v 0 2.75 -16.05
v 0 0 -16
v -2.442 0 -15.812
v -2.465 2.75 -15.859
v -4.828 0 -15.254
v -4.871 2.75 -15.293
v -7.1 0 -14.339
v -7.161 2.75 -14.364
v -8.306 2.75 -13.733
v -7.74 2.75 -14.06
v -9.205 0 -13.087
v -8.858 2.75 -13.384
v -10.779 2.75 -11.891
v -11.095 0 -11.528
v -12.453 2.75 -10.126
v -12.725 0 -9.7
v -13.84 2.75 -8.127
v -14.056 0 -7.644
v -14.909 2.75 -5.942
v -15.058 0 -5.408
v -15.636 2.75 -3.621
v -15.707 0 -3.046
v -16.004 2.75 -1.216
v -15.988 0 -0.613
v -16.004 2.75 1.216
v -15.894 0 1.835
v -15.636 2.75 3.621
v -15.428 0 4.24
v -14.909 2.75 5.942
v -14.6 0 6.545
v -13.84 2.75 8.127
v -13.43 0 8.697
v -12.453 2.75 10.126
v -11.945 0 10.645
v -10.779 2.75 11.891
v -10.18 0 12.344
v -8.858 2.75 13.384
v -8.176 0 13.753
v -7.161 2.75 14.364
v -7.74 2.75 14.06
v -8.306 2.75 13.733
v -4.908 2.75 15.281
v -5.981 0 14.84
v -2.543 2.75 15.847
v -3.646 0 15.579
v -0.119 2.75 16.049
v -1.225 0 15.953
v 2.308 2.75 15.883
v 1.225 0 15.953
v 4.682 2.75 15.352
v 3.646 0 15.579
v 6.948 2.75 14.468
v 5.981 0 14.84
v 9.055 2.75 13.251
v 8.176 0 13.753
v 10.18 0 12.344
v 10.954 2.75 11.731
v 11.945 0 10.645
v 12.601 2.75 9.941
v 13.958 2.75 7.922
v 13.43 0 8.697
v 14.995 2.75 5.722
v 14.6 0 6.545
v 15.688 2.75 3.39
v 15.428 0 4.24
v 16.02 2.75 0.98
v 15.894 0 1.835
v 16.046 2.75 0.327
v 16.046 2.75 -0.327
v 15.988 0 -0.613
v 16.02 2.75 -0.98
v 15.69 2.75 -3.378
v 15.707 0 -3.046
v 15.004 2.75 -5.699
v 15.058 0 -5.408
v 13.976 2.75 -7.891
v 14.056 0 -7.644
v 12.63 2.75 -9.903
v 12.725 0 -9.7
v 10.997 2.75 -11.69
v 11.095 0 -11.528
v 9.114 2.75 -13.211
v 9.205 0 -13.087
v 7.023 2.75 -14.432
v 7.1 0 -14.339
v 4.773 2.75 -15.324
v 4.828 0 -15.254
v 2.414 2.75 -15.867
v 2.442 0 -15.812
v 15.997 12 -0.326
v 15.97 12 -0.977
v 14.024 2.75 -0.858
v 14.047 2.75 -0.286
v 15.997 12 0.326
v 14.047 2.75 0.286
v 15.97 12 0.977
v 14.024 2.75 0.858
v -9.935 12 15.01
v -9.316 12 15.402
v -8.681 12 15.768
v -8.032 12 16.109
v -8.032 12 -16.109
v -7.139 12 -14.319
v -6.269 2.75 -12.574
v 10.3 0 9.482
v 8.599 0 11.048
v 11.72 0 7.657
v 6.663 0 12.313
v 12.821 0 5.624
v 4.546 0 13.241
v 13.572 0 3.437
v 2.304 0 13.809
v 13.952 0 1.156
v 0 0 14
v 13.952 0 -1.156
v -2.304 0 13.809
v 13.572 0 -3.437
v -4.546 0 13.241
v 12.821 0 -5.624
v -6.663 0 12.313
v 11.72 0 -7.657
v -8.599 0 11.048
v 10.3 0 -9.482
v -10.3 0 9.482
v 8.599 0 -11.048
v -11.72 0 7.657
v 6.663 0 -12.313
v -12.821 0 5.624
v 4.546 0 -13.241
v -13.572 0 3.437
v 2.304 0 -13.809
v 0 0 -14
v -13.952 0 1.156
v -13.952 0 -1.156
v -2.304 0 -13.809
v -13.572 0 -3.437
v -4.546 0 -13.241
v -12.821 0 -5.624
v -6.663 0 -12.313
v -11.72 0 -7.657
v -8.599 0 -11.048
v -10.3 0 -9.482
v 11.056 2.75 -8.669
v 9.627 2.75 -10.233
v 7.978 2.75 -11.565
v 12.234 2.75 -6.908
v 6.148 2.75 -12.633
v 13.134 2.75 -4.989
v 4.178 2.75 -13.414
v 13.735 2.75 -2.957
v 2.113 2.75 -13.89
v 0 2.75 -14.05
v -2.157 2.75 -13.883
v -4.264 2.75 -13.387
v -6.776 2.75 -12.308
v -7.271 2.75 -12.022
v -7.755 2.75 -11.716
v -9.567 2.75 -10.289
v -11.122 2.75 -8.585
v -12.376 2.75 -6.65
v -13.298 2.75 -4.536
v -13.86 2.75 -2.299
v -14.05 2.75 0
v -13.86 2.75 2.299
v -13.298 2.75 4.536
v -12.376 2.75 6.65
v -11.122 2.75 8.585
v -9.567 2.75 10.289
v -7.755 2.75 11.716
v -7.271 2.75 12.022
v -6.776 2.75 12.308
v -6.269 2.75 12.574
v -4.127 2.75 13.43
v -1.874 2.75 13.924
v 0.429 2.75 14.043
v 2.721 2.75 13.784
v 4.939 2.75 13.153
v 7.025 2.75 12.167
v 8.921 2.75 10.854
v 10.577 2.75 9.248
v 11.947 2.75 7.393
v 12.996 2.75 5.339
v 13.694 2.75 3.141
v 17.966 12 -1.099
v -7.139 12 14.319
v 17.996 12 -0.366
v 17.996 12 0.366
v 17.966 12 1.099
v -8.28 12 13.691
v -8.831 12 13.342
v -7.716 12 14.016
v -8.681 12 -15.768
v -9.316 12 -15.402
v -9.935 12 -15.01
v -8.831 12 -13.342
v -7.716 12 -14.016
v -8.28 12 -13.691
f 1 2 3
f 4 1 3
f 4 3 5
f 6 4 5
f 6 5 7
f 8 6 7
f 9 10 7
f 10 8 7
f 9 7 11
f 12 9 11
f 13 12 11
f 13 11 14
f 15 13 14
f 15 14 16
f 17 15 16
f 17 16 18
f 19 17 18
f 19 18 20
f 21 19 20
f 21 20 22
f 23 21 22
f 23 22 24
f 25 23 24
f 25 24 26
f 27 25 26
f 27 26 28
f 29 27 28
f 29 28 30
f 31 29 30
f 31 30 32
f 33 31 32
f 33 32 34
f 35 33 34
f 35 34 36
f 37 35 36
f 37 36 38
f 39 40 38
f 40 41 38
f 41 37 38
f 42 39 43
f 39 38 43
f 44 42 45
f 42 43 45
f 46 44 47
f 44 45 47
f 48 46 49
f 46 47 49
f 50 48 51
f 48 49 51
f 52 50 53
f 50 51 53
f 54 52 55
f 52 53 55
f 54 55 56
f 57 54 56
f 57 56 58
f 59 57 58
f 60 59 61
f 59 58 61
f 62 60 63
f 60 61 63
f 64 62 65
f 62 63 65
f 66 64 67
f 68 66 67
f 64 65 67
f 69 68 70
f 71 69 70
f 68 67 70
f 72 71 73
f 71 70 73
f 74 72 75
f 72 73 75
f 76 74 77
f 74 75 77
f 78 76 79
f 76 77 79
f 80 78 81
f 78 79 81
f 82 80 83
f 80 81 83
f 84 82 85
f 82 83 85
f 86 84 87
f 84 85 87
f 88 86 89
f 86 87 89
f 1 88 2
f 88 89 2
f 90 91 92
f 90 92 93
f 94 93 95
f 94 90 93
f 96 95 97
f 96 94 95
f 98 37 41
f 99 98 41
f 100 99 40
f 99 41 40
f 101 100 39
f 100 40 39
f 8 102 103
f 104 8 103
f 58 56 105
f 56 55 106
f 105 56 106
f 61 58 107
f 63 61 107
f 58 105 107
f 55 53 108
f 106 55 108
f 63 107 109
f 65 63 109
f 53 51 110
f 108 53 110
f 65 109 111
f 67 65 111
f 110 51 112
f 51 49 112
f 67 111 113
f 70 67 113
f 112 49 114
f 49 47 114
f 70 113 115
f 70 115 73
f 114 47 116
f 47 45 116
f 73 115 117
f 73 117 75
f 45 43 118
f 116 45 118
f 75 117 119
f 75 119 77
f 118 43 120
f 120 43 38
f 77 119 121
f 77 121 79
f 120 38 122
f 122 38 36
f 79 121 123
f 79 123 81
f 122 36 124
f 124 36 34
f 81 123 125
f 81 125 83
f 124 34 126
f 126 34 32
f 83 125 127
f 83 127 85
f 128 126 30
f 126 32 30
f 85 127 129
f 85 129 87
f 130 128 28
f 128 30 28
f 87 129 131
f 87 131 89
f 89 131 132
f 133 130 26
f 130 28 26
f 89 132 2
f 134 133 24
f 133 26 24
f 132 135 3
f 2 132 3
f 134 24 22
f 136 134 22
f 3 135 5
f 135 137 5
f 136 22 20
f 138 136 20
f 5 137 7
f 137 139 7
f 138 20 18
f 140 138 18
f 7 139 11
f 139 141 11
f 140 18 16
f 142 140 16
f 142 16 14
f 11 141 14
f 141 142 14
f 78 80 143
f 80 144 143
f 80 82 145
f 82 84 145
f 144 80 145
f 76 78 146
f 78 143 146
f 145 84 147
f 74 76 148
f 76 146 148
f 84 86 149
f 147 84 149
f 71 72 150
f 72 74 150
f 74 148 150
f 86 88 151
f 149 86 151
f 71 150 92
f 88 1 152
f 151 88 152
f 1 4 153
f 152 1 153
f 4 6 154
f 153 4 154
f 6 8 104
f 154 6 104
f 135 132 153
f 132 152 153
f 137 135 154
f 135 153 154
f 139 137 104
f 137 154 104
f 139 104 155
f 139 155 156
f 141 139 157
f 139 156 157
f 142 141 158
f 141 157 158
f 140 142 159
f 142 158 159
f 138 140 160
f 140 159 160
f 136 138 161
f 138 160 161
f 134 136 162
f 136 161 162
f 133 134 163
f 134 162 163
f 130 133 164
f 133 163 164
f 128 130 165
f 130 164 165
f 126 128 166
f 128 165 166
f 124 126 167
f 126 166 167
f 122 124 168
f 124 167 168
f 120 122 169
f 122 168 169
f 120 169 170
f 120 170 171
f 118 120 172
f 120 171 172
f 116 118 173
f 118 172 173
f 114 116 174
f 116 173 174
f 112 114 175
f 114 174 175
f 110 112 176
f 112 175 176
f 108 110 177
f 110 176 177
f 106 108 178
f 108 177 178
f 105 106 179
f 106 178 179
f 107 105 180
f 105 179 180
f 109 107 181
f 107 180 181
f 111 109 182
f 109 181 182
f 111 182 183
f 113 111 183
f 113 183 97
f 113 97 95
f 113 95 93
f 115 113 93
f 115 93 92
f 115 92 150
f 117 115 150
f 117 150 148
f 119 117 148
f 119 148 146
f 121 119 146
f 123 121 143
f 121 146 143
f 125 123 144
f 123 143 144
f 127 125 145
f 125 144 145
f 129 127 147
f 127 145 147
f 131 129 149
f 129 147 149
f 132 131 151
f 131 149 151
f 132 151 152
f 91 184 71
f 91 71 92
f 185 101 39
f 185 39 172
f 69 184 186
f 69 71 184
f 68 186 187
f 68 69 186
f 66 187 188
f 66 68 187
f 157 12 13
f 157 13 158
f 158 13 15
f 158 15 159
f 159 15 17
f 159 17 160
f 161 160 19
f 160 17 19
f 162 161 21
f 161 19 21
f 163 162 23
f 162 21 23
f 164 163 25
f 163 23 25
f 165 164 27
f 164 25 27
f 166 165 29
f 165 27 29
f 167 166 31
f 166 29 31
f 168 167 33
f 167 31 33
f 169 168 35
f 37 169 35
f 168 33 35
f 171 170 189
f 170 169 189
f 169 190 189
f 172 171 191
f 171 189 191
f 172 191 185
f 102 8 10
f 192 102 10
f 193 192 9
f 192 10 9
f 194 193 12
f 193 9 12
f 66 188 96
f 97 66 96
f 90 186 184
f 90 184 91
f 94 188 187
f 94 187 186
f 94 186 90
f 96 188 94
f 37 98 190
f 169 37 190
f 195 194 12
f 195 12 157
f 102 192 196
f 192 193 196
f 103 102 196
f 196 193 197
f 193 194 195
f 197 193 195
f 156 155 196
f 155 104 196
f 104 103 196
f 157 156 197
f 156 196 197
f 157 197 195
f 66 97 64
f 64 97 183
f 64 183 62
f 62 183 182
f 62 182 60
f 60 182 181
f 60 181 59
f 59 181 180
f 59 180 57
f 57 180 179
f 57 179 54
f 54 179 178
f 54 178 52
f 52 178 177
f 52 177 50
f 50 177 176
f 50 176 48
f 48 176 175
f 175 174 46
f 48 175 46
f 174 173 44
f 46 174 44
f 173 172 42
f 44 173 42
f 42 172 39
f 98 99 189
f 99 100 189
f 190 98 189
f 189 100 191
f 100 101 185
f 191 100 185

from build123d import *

# Parameters (mm, degrees)
REVOLVE2_ANGLE    = 7
CIRPATTERN1_COUNT = 3


with BuildPart() as part:
    # Sketch1 → Revolve1 (revolve)
    with BuildSketch(Plane.XY, mode=Mode.PRIVATE) as revolve1_sk:
        Polygon((14, 0), (14.049784483, 2.75), (16.049784483, 2.75), (16, 0), align=None)
    revolve(revolve1_sk.sketch.rotate(Axis((0, 0, 0), (0, 1, 0)), 90), axis=Axis((0, 0, 0), (0, 1, 0)))  # turned: the seam where the file's is

    # Sketch2 → Revolve2 (revolve, symmetric)
    with BuildSketch(Plane.XY) as revolve2_sk:
        Polygon((14.049784483, 2.75), (16, 12), (18, 12), (16.049784483, 2.75), align=None)
    revolve2 = revolve(axis=Axis((0, 0, 0), (0, 1, 0)), revolution_arc=REVOLVE2_ANGLE / 2)
    revolve2 = revolve2 + revolve(revolve2_sk.sketch, axis=Axis((0, 0, 0), (0, -1, 0)), revolution_arc=REVOLVE2_ANGLE / 2)

    # CirPattern1: Revolve2 ×3 about axis
    cirpattern1_axis = Axis((0, 0, 0), (0, 1, 0))
    for i in range(1, CIRPATTERN1_COUNT):
        add(revolve2.rotate(cirpattern1_axis, i * 360 / CIRPATTERN1_COUNT))


solid = part.part
